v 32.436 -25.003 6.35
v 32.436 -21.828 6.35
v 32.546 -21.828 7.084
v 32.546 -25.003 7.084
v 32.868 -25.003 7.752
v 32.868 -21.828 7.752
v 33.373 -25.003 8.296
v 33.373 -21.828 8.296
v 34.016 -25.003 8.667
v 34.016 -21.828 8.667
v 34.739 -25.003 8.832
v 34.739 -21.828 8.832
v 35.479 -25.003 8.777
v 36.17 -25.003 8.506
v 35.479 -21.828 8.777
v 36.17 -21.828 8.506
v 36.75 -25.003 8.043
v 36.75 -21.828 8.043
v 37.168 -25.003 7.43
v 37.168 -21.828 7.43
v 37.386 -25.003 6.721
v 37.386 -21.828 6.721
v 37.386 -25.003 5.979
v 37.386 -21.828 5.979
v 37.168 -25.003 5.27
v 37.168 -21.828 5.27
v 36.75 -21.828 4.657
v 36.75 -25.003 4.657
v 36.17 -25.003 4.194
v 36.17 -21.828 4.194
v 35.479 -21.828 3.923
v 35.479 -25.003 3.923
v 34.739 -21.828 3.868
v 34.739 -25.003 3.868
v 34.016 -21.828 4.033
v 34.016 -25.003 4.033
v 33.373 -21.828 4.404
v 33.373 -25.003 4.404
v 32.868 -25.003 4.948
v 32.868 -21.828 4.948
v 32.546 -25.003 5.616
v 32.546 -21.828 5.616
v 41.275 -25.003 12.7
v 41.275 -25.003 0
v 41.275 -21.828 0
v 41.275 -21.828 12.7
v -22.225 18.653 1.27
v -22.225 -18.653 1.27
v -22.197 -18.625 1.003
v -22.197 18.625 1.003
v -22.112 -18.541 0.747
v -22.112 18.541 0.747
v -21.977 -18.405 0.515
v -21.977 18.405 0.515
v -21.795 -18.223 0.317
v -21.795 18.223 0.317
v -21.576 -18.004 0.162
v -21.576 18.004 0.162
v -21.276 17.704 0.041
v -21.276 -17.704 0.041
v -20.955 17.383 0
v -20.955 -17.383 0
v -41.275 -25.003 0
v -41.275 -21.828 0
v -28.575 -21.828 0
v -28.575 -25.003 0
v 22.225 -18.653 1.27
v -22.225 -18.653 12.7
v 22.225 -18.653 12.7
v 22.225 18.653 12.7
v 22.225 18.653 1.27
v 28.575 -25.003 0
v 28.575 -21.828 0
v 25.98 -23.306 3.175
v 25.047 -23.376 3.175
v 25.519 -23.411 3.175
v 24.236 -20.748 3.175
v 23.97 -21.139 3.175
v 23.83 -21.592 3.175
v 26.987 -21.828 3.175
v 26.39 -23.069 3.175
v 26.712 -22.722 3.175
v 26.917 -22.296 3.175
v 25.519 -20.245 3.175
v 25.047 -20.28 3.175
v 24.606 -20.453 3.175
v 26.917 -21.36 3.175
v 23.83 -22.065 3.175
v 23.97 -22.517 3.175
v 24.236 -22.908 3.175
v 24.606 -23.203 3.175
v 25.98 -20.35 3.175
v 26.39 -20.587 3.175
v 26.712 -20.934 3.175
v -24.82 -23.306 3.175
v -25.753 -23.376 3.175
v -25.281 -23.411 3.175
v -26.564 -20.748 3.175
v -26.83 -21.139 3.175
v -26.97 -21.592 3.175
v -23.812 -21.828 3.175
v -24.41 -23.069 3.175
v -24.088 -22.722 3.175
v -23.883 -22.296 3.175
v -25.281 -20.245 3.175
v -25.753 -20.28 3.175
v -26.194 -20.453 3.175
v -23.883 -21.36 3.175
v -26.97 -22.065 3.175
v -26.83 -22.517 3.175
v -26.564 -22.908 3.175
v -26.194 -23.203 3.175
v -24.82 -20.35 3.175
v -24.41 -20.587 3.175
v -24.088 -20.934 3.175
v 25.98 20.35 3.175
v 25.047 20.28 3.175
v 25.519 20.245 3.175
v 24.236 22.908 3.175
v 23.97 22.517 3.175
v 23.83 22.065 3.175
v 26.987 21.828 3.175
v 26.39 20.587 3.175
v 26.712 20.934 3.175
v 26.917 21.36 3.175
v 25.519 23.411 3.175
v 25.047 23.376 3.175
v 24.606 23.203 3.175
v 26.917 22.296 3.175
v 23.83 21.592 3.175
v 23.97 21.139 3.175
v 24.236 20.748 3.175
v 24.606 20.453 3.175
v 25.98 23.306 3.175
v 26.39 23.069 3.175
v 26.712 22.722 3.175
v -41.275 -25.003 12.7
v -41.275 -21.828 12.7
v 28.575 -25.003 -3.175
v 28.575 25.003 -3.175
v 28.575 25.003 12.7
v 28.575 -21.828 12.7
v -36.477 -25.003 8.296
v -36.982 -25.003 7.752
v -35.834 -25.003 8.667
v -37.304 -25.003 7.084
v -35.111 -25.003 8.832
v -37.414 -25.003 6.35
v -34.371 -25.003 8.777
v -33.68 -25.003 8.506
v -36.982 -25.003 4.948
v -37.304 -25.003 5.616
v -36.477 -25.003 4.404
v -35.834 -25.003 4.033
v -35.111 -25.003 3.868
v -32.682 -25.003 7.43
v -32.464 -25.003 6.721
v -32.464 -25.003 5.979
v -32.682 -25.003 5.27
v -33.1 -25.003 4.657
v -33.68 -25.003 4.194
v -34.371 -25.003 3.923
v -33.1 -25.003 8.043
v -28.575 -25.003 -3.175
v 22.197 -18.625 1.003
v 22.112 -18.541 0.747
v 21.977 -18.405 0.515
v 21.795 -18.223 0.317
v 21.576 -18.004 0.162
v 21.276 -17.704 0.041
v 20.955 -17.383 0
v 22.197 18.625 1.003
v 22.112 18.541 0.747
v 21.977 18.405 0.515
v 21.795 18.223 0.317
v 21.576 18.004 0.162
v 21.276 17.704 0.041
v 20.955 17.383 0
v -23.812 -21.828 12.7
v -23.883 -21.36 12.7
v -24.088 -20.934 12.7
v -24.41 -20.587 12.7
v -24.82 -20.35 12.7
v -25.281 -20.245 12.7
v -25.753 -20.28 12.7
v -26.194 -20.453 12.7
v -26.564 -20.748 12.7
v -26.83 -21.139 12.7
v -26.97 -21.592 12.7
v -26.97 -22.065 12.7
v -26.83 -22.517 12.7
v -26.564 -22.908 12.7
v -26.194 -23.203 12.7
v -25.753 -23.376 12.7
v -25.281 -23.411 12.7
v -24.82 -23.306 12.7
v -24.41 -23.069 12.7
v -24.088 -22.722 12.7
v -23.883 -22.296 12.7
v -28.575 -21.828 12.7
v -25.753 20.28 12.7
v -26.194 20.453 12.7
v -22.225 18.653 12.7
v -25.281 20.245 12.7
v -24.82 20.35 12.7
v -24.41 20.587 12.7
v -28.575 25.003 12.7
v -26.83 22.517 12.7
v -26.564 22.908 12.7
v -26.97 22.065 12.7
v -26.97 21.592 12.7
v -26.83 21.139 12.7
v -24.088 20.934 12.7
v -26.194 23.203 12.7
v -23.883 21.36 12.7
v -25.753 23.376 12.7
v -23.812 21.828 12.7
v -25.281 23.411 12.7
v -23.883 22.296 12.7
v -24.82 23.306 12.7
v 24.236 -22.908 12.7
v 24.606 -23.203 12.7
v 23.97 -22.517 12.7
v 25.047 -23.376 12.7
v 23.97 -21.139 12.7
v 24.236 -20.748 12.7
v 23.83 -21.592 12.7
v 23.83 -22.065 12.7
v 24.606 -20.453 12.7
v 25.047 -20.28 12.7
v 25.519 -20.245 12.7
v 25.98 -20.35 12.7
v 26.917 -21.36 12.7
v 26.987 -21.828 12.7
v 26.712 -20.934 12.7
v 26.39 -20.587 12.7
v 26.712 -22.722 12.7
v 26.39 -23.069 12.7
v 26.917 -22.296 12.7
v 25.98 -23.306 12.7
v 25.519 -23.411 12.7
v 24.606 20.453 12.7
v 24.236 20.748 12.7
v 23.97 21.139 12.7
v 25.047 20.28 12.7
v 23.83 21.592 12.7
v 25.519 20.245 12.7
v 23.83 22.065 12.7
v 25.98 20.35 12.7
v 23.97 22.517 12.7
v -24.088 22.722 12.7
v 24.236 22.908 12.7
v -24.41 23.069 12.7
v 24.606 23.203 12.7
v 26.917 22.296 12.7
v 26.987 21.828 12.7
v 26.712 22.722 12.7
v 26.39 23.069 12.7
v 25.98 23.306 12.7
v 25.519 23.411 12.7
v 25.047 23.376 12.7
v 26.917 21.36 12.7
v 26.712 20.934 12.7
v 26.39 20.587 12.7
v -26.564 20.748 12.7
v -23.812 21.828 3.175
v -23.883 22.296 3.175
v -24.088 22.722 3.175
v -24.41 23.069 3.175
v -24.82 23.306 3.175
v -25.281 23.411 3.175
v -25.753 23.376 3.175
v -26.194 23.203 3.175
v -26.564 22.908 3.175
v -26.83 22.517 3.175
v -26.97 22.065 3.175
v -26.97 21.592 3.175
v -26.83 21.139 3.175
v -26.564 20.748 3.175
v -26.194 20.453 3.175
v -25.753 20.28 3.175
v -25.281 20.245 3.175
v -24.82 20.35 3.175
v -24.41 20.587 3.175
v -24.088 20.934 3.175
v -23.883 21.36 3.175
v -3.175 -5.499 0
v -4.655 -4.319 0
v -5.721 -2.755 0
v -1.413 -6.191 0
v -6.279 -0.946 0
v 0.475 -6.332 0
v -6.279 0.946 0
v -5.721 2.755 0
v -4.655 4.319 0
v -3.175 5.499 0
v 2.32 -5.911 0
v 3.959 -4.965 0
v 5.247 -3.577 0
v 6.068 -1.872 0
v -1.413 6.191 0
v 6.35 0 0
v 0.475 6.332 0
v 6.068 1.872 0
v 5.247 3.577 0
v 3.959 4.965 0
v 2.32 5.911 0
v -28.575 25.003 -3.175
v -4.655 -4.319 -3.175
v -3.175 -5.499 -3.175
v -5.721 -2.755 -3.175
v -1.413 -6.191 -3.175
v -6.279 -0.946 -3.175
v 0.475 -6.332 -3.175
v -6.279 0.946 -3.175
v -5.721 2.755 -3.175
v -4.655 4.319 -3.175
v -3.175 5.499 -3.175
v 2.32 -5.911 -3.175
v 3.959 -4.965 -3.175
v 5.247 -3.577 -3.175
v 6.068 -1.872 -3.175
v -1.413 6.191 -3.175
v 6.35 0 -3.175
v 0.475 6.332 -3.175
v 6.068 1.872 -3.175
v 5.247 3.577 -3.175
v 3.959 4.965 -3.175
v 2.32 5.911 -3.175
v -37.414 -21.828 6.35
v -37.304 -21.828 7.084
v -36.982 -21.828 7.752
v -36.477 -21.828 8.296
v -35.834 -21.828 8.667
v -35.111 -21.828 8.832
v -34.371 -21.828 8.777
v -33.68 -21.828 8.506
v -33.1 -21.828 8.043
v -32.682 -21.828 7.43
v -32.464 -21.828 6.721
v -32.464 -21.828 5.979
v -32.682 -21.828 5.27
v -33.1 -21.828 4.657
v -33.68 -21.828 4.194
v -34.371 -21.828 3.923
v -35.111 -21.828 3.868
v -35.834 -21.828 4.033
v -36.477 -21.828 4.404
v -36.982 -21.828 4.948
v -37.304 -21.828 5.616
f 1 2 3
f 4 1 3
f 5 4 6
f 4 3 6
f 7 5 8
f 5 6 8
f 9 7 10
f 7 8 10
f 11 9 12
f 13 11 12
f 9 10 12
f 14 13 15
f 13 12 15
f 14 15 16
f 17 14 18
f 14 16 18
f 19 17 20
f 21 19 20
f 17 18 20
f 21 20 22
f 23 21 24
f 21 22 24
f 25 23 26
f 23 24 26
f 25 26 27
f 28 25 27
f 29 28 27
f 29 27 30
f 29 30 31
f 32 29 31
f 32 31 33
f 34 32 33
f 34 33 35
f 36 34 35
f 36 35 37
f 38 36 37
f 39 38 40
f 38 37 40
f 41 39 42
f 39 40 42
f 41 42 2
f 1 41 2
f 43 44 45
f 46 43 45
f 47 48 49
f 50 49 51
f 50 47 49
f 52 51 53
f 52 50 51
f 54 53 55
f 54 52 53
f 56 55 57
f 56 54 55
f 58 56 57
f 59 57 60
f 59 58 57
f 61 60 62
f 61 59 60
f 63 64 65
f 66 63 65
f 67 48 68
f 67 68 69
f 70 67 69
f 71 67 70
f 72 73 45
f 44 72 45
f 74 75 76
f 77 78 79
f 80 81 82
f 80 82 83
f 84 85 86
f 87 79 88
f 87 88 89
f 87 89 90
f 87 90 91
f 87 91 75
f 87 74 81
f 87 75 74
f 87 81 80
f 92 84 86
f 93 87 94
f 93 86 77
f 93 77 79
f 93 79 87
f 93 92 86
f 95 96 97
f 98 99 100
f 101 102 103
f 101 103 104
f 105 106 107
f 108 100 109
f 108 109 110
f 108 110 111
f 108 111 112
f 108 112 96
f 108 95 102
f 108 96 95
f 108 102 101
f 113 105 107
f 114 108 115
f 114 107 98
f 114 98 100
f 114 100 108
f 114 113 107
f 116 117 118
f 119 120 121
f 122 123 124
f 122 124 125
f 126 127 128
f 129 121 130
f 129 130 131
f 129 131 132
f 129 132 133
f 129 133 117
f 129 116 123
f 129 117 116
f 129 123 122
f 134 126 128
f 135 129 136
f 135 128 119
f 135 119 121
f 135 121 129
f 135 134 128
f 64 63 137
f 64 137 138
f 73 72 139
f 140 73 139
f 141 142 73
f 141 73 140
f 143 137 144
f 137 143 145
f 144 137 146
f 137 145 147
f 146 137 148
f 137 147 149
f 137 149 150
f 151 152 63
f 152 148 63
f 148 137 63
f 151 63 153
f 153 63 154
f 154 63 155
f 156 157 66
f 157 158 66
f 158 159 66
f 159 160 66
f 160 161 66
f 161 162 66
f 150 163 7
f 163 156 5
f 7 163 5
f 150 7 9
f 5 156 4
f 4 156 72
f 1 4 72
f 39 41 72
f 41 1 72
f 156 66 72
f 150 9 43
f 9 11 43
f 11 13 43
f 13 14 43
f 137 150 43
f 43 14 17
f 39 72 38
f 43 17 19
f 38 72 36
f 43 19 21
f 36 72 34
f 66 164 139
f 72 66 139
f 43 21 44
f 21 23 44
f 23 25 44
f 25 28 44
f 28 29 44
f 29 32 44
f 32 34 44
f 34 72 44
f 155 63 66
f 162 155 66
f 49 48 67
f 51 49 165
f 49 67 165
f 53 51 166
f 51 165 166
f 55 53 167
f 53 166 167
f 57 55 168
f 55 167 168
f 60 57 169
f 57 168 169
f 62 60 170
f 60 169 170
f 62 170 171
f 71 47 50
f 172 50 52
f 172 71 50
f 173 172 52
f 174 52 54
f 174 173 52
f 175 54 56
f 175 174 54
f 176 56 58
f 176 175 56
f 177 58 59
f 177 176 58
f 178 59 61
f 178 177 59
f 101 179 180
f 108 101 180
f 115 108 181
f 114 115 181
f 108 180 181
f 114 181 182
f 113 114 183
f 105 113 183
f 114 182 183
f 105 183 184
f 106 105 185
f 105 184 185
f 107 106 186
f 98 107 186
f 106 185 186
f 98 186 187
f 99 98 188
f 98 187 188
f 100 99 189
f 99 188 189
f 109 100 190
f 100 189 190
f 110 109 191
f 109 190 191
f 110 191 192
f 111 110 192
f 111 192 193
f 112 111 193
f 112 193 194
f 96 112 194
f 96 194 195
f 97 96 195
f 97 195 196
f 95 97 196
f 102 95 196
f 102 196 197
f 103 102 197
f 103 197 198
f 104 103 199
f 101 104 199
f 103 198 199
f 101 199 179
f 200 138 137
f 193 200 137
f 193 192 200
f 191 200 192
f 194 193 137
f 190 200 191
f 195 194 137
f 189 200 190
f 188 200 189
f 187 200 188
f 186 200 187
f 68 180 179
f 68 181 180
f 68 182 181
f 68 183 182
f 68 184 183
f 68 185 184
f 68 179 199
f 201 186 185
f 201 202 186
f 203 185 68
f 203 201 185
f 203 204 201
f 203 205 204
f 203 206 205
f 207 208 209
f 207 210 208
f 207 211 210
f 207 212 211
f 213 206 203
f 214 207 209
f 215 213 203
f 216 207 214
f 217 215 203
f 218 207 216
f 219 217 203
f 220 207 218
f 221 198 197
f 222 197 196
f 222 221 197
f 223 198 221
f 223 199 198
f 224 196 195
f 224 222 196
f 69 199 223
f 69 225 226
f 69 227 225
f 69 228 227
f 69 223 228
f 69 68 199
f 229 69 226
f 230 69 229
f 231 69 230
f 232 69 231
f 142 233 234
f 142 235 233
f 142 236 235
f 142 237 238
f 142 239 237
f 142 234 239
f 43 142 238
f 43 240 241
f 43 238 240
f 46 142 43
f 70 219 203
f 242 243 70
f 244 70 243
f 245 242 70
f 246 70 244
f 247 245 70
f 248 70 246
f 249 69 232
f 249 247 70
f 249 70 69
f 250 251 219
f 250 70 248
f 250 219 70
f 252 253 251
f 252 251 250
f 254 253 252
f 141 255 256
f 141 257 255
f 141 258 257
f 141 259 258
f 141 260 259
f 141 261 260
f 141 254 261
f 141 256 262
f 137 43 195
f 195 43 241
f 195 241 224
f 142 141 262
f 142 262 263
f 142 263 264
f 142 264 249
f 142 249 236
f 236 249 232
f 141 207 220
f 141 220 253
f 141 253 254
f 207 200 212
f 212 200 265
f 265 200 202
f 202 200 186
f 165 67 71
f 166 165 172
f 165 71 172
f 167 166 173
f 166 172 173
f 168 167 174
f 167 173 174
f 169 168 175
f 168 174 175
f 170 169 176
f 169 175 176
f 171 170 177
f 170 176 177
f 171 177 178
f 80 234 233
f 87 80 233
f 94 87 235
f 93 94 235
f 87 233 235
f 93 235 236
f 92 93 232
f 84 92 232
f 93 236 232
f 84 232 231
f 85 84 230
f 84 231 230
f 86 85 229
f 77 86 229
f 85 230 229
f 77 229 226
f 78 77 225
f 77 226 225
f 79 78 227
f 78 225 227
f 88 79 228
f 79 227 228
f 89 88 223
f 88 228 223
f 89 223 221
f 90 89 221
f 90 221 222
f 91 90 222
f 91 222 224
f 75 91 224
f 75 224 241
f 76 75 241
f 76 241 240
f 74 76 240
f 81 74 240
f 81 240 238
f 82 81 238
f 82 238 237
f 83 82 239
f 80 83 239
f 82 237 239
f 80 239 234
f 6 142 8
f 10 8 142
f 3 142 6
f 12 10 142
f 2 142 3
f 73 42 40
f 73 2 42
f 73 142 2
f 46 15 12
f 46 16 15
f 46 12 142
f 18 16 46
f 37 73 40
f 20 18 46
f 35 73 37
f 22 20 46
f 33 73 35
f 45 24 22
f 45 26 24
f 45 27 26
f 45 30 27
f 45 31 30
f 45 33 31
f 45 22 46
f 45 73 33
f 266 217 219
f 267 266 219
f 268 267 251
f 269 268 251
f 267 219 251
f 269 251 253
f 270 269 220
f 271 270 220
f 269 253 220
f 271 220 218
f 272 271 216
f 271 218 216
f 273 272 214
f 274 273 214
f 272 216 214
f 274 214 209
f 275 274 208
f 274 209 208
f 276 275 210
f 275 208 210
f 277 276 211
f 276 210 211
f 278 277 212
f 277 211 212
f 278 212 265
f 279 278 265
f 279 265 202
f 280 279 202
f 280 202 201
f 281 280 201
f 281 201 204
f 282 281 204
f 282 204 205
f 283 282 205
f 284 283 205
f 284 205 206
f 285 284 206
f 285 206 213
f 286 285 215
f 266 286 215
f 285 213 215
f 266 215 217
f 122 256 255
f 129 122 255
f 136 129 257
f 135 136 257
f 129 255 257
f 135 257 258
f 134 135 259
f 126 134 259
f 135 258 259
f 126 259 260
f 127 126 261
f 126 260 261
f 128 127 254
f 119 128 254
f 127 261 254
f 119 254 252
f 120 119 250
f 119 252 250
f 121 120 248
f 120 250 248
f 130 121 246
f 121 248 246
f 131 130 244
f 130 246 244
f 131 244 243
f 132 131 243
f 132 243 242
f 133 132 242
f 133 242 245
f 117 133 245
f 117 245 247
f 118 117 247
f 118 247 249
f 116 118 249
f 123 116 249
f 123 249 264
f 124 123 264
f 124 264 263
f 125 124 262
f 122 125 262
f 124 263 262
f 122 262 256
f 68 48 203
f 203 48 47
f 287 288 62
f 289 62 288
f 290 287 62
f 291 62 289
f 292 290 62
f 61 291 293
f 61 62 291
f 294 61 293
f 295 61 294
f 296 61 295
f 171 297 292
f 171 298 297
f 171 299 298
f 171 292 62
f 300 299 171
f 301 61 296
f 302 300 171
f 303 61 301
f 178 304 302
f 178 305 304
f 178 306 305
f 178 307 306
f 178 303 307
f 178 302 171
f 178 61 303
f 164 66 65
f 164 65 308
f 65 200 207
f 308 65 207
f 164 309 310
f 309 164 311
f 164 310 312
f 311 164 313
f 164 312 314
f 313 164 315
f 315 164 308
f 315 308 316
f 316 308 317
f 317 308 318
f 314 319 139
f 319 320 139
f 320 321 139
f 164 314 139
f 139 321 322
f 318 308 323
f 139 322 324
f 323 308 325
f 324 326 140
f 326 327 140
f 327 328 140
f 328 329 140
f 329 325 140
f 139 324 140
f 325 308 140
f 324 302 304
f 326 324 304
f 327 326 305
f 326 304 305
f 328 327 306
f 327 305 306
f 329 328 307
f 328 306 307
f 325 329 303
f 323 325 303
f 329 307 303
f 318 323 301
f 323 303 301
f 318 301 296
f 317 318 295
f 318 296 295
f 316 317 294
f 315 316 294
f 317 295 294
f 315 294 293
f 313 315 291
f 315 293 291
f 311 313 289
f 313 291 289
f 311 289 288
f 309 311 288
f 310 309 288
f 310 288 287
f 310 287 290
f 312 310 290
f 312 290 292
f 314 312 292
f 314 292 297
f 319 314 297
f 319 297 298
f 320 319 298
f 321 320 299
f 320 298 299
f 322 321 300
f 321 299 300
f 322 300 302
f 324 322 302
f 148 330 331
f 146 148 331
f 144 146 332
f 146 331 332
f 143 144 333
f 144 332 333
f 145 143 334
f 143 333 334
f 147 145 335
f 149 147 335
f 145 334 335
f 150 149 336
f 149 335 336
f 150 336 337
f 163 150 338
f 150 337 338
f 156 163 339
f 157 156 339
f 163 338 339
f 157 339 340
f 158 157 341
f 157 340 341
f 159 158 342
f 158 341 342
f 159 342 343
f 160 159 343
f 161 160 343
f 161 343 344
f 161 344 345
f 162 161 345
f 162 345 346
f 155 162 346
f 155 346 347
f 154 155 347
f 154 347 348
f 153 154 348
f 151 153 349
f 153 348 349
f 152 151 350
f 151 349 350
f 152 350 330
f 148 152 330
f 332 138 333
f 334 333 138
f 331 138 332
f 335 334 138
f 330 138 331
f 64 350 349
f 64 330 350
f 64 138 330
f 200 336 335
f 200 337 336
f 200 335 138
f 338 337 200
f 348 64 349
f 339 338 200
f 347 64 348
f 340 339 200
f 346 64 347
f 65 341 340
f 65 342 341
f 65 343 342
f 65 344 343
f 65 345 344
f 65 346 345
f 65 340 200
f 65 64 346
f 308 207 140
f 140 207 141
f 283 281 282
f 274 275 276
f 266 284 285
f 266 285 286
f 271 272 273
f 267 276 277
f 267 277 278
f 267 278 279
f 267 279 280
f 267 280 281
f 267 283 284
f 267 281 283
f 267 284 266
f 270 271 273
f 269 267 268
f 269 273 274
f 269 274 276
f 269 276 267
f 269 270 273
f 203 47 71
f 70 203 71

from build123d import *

# Parameters (mm, degrees)
SKETCH1_W           = 57.15
SKETCH1_H           = 50.00625
SKETCH1_W_2         = 44.45
SKETCH1_H_2         = 37.30625
BOSS_EXTRUDE1_DEPTH = 12.7
SKETCH2_W           = 57.15
SKETCH2_H           = 50.00625
SKETCH2_R           = 6.35
BOSS_EXTRUDE2_DEPTH = 3.175
SKETCH4_W           = 12.7
SKETCH4_H           = 3.175
BOSS_EXTRUDE3_DEPTH = 12.7
SKETCH5_R           = 2.4892
CUT_EXTRUDE1_DEPTH  = 3.175
FILLET1_R           = 1.27
SKETCH6_R           = 1.5875
CUT_EXTRUDE2_DEPTH  = 9.525


with BuildPart() as part:
    # Sketch1 → Boss-Extrude1 (new body)
    with BuildSketch(Plane.XY):
        Rectangle(SKETCH1_W, SKETCH1_H)
        Rectangle(SKETCH1_W_2, SKETCH1_H_2, mode=Mode.SUBTRACT)
    extrude(amount=BOSS_EXTRUDE1_DEPTH)

    # Sketch2 → Boss-Extrude2 (add)
    with BuildSketch(Plane.XY):
        Rectangle(SKETCH2_W, SKETCH2_H)
        Circle(SKETCH2_R, mode=Mode.SUBTRACT)
    extrude(amount=-BOSS_EXTRUDE2_DEPTH)

    # Sketch4 → Boss-Extrude3 (add)
    with BuildSketch(Plane.XY):
        with Locations((-34.925, -23.415625)):
            Rectangle(SKETCH4_W, SKETCH4_H)
        with Locations((34.925, -23.415625)):
            Rectangle(SKETCH4_W, SKETCH4_H)
    extrude(amount=BOSS_EXTRUDE3_DEPTH)

    # Sketch5 → Cut-Extrude1 (cut)
    with BuildSketch(Plane(origin=(0, -21.828125, 0), x_dir=(1, 0, 0), z_dir=(0, 1, 0))):
        with Locations(Location((-34.925, -6.35, 0), (0, 0, 180))):
            Circle(SKETCH5_R)
        with Locations(Location((34.925, -6.35, 0), (0, 0, 180))):
            Circle(SKETCH5_R)
    extrude(amount=-CUT_EXTRUDE1_DEPTH, mode=Mode.SUBTRACT)

    # Fillet1
    fillet1_edges = [part.edges().sort_by_distance(p)[0] for p in [
        (-22.225, 0, 0),
        (0, -18.653125, 0),
        (22.225, 0, 0),
        (0, 18.653125, 0),
    ]]
    fillet(fillet1_edges, radius=FILLET1_R)

    # Sketch6 → Cut-Extrude2 (cut)
    with BuildSketch(Plane.XY.offset(12.7)):
        with Locations((-25.4, 21.828125)):
            Circle(SKETCH6_R)
        with Locations((25.4, 21.828125)):
            Circle(SKETCH6_R)
        with Locations((25.4, -21.828125)):
            Circle(SKETCH6_R)
        with Locations((-25.4, -21.828125)):
            Circle(SKETCH6_R)
    extrude(amount=-CUT_EXTRUDE2_DEPTH, mode=Mode.SUBTRACT)


solid = part.part
